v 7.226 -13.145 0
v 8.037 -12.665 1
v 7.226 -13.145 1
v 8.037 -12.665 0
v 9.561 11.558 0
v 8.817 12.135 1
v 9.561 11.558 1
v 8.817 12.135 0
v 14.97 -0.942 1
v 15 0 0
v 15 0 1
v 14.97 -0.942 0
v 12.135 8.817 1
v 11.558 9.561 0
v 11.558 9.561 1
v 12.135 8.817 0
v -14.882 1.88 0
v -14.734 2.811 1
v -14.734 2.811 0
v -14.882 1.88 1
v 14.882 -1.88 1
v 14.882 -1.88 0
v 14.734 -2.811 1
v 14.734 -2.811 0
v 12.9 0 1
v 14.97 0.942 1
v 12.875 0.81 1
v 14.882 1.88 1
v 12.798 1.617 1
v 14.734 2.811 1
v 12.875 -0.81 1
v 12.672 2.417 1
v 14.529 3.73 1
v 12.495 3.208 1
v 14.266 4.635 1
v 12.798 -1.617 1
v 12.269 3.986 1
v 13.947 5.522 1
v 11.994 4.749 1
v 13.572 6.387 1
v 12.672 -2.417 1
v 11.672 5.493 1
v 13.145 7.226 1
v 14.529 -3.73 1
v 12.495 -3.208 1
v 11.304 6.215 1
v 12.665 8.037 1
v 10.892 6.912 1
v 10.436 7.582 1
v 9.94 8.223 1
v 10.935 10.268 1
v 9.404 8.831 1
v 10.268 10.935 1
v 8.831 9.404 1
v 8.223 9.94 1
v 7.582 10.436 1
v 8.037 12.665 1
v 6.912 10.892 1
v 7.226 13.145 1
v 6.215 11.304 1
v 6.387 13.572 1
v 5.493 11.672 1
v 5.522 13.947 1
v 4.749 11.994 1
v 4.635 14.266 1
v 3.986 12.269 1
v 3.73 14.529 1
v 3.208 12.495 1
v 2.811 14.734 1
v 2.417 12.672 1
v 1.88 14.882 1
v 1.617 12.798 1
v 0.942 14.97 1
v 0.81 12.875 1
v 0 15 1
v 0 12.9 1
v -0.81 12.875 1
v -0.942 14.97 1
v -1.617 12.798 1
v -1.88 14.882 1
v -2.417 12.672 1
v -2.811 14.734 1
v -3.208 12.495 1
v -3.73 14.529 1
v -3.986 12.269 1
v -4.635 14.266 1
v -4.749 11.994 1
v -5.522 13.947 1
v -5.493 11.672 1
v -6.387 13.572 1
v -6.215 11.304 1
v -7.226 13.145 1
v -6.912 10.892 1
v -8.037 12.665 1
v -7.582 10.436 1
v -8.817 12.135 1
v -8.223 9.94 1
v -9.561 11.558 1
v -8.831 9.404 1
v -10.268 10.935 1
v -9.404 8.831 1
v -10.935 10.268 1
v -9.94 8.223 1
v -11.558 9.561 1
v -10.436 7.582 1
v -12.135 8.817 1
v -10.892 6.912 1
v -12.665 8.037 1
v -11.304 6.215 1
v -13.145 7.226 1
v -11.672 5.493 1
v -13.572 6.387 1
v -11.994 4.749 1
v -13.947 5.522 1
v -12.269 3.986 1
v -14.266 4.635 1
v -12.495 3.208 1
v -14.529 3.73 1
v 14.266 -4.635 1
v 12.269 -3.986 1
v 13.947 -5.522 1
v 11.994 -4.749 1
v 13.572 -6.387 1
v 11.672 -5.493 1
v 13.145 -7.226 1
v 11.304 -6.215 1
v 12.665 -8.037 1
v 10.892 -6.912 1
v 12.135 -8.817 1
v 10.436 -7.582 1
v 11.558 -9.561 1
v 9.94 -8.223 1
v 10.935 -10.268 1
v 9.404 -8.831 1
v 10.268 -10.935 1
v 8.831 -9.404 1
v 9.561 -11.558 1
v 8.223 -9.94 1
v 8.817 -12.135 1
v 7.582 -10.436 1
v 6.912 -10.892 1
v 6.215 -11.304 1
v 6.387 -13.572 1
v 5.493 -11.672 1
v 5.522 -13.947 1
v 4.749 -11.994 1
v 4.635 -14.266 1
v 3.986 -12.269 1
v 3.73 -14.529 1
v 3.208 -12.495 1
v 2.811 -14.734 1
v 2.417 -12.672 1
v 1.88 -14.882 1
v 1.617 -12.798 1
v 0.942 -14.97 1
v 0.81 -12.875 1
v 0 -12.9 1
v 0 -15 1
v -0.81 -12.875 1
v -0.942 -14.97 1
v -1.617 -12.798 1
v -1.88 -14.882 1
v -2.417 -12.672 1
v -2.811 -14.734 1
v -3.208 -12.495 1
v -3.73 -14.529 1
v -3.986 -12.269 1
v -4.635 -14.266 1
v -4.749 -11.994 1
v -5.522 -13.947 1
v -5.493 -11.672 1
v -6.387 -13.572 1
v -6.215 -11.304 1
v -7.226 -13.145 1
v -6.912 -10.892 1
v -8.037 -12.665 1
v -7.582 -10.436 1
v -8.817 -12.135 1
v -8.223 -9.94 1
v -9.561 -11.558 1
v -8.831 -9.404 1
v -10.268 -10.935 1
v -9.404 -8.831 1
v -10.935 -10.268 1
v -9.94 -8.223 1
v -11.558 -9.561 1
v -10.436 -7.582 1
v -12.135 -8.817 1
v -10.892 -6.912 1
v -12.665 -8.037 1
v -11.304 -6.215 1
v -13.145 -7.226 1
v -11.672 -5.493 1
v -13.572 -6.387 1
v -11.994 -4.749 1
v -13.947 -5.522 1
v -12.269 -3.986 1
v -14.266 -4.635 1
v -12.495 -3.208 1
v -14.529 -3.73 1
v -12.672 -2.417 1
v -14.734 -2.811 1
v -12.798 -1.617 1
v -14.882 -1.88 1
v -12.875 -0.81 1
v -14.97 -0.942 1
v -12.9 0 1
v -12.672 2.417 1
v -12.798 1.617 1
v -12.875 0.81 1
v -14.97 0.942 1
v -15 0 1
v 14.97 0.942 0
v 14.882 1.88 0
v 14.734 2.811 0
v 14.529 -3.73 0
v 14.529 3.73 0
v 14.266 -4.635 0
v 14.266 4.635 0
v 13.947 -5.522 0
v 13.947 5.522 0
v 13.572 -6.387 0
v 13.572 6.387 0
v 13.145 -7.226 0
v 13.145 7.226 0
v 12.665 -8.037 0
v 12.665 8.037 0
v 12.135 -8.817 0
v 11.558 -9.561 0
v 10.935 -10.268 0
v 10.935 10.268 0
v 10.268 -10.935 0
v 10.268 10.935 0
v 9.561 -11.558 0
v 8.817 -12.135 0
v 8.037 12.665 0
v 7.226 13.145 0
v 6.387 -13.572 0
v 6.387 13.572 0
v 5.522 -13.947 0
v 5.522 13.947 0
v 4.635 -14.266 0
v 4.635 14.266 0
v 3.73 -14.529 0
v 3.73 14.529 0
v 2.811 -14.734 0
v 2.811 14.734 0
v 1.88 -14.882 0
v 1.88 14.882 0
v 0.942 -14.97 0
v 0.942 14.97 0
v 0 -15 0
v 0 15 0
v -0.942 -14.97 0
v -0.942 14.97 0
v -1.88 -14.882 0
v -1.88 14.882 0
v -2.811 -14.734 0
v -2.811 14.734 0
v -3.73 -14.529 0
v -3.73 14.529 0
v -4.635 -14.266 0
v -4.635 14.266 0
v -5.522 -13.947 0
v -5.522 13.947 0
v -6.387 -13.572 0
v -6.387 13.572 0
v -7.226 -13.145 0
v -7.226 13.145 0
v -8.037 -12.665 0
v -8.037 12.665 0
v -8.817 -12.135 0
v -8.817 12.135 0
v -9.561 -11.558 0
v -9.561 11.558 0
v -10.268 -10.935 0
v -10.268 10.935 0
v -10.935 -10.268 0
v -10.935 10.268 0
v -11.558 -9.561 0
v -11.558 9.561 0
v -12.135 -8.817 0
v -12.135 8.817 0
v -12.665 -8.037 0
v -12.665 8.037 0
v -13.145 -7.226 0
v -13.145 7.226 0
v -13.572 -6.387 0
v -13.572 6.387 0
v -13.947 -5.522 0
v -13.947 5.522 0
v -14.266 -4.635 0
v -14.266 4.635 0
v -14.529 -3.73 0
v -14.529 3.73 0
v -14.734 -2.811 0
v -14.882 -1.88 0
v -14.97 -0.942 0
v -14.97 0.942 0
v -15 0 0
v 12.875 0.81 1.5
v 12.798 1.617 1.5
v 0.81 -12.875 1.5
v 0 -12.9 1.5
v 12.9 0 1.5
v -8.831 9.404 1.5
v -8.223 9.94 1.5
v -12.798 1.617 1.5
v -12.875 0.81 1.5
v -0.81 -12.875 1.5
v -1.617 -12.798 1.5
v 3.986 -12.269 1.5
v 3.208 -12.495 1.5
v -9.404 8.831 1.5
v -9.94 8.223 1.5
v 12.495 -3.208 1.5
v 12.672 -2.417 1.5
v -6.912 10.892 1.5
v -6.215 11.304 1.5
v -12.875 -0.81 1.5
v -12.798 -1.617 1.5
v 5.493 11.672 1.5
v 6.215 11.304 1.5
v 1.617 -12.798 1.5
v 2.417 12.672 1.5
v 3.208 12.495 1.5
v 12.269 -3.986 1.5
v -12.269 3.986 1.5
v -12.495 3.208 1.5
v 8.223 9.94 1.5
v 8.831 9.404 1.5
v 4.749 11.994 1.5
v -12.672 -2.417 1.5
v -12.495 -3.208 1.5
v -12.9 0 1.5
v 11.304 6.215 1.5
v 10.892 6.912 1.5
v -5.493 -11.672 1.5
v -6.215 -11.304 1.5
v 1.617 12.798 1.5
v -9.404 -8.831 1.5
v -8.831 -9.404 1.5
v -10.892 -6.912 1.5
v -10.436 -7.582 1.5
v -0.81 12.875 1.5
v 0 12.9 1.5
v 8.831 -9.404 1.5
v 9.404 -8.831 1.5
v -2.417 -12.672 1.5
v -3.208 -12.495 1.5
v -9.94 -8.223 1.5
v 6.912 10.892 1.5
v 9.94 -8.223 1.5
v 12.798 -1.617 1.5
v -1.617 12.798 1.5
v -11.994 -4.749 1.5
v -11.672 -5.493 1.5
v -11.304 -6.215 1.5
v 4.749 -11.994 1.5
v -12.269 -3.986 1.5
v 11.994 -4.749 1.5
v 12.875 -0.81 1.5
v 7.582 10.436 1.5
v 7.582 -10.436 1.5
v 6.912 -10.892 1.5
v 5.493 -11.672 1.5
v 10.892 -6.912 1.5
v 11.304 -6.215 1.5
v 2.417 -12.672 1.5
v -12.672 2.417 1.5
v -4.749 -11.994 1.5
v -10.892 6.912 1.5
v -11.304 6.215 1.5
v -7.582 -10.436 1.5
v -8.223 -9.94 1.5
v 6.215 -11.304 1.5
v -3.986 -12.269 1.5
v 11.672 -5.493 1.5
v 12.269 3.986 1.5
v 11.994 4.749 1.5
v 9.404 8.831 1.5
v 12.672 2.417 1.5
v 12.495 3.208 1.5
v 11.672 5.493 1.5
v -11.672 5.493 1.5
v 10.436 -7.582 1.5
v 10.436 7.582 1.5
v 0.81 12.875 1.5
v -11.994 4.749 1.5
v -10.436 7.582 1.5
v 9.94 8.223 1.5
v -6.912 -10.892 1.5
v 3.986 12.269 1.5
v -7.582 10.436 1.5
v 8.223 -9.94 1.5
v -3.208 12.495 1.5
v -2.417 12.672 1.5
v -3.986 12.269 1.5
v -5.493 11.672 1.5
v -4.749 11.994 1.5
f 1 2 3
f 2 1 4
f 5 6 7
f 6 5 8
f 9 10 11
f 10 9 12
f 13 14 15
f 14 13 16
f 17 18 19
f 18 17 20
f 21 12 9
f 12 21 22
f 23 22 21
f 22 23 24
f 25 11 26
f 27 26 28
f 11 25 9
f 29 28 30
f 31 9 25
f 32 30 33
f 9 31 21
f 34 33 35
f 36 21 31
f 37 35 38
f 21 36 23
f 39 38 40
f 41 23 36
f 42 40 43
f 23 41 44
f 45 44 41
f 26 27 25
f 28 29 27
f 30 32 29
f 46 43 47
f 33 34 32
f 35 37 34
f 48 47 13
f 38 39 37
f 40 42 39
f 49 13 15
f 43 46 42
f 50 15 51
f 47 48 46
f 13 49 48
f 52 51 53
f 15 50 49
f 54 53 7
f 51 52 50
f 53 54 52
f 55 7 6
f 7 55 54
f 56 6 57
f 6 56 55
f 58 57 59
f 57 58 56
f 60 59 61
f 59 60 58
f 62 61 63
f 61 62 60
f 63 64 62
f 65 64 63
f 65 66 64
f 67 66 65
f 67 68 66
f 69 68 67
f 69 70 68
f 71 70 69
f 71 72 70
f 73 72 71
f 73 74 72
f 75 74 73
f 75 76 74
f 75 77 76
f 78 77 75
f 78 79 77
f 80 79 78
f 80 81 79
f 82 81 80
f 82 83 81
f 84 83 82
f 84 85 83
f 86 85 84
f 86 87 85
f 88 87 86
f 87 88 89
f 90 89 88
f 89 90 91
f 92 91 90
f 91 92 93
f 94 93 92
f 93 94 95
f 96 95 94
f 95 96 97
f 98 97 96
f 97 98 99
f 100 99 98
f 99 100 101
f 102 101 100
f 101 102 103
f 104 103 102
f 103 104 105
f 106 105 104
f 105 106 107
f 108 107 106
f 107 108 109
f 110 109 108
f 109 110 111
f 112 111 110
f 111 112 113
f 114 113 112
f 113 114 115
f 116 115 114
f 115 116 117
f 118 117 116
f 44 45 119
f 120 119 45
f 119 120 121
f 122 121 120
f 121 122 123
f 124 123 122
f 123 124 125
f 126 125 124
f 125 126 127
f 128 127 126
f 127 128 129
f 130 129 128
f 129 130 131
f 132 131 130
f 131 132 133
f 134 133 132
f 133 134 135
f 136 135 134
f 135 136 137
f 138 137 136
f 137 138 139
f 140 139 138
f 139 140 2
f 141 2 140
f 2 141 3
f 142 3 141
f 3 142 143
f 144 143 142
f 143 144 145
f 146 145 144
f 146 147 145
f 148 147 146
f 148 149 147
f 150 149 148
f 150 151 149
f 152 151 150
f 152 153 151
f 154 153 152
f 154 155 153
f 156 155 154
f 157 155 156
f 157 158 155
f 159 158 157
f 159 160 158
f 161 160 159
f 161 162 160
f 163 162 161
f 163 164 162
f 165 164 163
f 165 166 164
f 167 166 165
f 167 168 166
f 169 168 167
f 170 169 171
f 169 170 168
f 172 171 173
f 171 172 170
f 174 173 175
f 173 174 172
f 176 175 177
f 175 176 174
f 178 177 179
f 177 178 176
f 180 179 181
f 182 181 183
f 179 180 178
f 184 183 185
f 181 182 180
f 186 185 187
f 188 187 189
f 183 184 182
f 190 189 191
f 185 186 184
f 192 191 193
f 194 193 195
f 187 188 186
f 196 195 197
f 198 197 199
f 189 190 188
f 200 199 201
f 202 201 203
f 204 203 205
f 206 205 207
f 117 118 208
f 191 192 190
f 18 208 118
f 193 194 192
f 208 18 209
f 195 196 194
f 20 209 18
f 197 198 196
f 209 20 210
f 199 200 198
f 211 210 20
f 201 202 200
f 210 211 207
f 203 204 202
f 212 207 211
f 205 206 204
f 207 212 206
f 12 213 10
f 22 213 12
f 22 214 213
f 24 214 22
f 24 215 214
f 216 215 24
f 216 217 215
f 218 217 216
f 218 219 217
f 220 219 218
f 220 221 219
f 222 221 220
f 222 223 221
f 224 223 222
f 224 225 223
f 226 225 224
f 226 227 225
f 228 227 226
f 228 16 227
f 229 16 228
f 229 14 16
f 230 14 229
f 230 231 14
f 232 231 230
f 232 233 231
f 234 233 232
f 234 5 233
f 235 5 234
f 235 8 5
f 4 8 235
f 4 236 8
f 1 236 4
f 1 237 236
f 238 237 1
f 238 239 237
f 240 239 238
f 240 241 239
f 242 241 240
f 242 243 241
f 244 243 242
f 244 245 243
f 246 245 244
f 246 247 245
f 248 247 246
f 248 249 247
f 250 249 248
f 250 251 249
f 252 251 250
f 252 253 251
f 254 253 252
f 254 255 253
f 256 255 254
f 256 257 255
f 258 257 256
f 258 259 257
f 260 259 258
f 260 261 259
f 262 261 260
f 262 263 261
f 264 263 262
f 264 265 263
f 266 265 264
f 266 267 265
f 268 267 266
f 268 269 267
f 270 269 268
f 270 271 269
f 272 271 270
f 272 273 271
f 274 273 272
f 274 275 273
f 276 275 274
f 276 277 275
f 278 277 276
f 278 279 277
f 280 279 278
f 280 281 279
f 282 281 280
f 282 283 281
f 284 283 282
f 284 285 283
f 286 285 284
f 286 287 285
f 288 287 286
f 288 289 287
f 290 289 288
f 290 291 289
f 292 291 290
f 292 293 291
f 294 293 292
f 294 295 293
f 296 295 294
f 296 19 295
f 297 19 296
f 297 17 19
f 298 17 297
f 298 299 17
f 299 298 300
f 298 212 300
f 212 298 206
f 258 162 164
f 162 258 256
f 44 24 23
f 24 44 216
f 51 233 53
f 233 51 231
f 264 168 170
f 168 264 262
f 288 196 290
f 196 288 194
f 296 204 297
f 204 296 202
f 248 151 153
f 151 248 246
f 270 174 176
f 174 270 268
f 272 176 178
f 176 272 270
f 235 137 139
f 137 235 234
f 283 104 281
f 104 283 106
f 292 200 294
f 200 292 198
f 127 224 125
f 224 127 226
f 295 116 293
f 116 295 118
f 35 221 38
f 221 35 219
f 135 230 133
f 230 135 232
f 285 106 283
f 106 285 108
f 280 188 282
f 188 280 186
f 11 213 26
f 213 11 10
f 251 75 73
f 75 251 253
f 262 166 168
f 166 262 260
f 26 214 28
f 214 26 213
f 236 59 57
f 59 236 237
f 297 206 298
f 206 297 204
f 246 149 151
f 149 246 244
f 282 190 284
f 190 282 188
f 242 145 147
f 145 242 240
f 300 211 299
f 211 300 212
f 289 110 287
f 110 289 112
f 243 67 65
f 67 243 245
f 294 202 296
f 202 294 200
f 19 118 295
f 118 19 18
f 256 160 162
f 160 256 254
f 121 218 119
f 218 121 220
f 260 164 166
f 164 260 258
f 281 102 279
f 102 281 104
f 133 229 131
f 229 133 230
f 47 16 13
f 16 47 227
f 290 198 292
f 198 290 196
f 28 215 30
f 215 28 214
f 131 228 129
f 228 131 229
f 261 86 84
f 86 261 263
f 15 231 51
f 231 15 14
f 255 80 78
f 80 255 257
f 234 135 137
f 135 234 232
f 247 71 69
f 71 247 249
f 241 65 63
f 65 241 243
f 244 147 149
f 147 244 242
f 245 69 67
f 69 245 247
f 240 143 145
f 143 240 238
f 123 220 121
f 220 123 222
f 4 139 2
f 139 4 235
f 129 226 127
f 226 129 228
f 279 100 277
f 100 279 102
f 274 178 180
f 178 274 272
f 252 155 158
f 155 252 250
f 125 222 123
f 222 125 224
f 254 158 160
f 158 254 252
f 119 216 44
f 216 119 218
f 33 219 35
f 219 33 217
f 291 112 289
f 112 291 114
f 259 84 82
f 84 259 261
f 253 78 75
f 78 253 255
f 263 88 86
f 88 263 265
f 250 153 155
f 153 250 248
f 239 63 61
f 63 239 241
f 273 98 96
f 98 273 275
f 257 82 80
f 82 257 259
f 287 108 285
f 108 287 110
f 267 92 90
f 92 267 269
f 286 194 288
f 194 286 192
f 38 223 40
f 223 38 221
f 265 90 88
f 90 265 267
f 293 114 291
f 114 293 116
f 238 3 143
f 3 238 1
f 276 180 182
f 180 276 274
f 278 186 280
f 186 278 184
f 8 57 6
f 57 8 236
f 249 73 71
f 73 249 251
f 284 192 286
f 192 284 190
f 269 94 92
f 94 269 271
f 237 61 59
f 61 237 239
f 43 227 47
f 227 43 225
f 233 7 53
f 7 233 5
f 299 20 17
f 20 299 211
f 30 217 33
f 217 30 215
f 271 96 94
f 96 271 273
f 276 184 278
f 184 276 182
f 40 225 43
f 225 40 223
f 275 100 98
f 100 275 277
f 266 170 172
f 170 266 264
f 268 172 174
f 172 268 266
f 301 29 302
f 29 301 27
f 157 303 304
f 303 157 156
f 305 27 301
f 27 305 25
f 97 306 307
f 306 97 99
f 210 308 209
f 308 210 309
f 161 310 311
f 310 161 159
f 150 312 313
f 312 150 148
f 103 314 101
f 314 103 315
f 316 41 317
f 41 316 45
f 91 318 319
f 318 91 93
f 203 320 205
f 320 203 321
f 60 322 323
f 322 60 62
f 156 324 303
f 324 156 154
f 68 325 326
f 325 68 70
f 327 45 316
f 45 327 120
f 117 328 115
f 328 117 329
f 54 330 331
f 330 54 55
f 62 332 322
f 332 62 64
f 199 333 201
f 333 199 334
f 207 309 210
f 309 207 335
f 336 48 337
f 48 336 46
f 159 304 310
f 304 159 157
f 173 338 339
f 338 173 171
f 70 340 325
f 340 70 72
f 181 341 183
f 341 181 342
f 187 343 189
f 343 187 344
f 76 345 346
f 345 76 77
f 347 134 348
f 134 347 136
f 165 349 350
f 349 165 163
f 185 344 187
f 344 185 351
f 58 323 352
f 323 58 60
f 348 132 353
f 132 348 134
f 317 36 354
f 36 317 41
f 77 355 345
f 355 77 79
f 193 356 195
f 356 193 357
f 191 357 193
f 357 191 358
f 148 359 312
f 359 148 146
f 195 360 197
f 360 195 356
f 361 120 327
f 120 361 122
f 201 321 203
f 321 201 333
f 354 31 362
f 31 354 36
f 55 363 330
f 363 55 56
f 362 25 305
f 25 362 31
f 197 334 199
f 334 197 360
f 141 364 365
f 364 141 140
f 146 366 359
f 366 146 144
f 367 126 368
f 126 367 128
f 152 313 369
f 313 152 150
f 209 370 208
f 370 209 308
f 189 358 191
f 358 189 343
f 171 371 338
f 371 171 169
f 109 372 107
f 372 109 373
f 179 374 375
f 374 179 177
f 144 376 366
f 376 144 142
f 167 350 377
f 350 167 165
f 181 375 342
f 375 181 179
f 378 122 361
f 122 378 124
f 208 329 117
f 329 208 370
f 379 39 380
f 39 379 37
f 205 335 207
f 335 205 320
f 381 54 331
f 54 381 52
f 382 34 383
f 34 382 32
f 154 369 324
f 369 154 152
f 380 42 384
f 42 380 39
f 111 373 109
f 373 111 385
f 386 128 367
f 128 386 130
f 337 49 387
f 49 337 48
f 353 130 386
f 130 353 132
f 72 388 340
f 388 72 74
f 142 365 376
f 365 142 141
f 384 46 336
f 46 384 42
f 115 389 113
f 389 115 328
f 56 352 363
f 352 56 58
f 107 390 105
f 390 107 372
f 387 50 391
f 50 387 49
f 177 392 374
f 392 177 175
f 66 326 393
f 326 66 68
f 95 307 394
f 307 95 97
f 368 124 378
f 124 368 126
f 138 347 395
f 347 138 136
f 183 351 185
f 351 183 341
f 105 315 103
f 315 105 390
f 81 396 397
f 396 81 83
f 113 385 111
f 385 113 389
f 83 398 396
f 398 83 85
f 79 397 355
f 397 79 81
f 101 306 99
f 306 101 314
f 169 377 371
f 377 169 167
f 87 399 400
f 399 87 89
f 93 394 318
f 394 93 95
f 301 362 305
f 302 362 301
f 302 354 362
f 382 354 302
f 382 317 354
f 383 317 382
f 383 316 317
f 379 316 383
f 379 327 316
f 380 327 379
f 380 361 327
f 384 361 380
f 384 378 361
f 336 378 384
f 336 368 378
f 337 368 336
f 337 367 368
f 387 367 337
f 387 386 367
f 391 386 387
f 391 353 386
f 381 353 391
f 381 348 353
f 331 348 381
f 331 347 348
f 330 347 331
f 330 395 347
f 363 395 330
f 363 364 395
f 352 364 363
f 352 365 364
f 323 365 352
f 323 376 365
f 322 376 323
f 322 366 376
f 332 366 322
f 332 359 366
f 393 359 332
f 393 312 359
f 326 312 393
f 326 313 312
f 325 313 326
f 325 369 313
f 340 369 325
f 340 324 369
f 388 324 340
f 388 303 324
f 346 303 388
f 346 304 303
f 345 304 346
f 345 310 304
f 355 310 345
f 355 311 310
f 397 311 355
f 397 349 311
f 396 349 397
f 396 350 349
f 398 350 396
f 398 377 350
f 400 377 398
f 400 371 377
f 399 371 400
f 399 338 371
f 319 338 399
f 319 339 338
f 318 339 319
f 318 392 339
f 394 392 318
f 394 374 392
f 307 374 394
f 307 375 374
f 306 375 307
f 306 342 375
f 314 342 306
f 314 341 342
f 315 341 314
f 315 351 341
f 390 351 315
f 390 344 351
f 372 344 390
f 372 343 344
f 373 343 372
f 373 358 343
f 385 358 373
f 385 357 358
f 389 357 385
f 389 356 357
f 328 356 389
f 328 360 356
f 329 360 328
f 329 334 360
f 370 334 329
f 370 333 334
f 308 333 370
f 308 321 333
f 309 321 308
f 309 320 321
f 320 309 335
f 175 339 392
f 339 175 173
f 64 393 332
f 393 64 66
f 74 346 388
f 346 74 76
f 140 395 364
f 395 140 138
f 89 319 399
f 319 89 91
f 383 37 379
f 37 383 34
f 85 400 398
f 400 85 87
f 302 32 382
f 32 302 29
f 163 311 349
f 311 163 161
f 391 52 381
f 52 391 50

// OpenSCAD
/* MEASUREMENTS
 * 
 * Outer Diameter (Both sides): 29mm
 * Inner Diameter (cover): 26mm
 * Inner Diameter (Mounting Cutout): 21mm
 * Connecting Part length: 10mm
 * Connecting Part width: 10mm
 *
 */

outer_diameter = 30;
cover_inner_diameter = 26;
mount_inner_diameter = 22;
connector_size = [10, 10];
lid_overlap = .5;
cover_total_height = 9;
clip_ring_inner_dia = 24.5;
clip_ring_offset = 2.2;
pulltab_stickout = 10;
pulltab_height = cover_total_height + 5;
pulltab_width = 10;
pulltab_thickness = 2;

$fn = 100;

module mount() {
    linear_extrude(1.7)
    difference() {
	circle(r=outer_diameter / 2);
	circle(r=mount_inner_diameter / 2);
    }
}

module connector() {
    cover_overlap = (outer_diameter - cover_inner_diameter) / 2;
    linear_extrude(1)
    translate([-connector_size.x/2, -cover_overlap])
    difference() {
	square([connector_size.x, connector_size.y + (outer_diameter - mount_inner_diameter) / 2 + cover_overlap]);
    }
}

module cover() {
    wall_thickness = (outer_diameter - 1 - cover_inner_diameter)/2;
    linear_extrude(cover_total_height - wall_thickness + lid_overlap)
    difference() {
	circle(r=outer_diameter / 2);
	circle(r=cover_inner_diameter / 2);
    }

/*
    translate([0,0,cover_total_height - wall_thickness])
    linear_extrude(wall_thickness)
    circle(r=outer_diameter/2);
*/

    clip_size = (cover_inner_diameter - clip_ring_inner_dia) / 2;
    translate([0,0,clip_ring_offset])
    rotate_extrude()
    translate([cover_inner_diameter/2,0])
    rotate([0,0,90])
    polygon([[0,0],
	     [clip_size*2, 0],
	     [clip_size, clip_size],
    ]);
}

module pulltab() {
    cover_overlap = (outer_diameter - cover_inner_diameter) / 2;

    linear_extrude(pulltab_thickness)
    translate([-pulltab_width/2, -pulltab_stickout])
    square([pulltab_width, pulltab_stickout + cover_overlap]);

    top_rad = pulltab_width / 2;
    
    translate([0,-pulltab_stickout])
    rotate([90,0,0])
    linear_extrude(pulltab_thickness) {
	translate([-pulltab_width/2, 0])
	square([pulltab_width, pulltab_height - top_rad]);
	translate([0,pulltab_height - top_rad])
	circle(top_rad);
    }

    translate([pulltab_width/2, -pulltab_stickout + pulltab_thickness, pulltab_thickness*2])
    rotate([0,90,180])
    linear_extrude(pulltab_width)
    difference() {
	square([pulltab_thickness, pulltab_thickness]);
	circle(pulltab_thickness);

    }
}

module assembly_cap() {
    translate([0,outer_diameter + connector_size.y])
    mount();

    translate([0, outer_diameter/2])
    connector();

    cover();

    translate([0, -outer_diameter/2])
    pulltab();
}

module lid() {
    wall_thickness = (outer_diameter - 1 - cover_inner_diameter)/2;

    linear_extrude(wall_thickness - lid_overlap)
    circle(r=outer_diameter/2);
    translate([0,0,wall_thickness - lid_overlap])
    linear_extrude(lid_overlap)
    circle(r=cover_inner_diameter/2 - .1);
}

//assembly_cap();
lid();
